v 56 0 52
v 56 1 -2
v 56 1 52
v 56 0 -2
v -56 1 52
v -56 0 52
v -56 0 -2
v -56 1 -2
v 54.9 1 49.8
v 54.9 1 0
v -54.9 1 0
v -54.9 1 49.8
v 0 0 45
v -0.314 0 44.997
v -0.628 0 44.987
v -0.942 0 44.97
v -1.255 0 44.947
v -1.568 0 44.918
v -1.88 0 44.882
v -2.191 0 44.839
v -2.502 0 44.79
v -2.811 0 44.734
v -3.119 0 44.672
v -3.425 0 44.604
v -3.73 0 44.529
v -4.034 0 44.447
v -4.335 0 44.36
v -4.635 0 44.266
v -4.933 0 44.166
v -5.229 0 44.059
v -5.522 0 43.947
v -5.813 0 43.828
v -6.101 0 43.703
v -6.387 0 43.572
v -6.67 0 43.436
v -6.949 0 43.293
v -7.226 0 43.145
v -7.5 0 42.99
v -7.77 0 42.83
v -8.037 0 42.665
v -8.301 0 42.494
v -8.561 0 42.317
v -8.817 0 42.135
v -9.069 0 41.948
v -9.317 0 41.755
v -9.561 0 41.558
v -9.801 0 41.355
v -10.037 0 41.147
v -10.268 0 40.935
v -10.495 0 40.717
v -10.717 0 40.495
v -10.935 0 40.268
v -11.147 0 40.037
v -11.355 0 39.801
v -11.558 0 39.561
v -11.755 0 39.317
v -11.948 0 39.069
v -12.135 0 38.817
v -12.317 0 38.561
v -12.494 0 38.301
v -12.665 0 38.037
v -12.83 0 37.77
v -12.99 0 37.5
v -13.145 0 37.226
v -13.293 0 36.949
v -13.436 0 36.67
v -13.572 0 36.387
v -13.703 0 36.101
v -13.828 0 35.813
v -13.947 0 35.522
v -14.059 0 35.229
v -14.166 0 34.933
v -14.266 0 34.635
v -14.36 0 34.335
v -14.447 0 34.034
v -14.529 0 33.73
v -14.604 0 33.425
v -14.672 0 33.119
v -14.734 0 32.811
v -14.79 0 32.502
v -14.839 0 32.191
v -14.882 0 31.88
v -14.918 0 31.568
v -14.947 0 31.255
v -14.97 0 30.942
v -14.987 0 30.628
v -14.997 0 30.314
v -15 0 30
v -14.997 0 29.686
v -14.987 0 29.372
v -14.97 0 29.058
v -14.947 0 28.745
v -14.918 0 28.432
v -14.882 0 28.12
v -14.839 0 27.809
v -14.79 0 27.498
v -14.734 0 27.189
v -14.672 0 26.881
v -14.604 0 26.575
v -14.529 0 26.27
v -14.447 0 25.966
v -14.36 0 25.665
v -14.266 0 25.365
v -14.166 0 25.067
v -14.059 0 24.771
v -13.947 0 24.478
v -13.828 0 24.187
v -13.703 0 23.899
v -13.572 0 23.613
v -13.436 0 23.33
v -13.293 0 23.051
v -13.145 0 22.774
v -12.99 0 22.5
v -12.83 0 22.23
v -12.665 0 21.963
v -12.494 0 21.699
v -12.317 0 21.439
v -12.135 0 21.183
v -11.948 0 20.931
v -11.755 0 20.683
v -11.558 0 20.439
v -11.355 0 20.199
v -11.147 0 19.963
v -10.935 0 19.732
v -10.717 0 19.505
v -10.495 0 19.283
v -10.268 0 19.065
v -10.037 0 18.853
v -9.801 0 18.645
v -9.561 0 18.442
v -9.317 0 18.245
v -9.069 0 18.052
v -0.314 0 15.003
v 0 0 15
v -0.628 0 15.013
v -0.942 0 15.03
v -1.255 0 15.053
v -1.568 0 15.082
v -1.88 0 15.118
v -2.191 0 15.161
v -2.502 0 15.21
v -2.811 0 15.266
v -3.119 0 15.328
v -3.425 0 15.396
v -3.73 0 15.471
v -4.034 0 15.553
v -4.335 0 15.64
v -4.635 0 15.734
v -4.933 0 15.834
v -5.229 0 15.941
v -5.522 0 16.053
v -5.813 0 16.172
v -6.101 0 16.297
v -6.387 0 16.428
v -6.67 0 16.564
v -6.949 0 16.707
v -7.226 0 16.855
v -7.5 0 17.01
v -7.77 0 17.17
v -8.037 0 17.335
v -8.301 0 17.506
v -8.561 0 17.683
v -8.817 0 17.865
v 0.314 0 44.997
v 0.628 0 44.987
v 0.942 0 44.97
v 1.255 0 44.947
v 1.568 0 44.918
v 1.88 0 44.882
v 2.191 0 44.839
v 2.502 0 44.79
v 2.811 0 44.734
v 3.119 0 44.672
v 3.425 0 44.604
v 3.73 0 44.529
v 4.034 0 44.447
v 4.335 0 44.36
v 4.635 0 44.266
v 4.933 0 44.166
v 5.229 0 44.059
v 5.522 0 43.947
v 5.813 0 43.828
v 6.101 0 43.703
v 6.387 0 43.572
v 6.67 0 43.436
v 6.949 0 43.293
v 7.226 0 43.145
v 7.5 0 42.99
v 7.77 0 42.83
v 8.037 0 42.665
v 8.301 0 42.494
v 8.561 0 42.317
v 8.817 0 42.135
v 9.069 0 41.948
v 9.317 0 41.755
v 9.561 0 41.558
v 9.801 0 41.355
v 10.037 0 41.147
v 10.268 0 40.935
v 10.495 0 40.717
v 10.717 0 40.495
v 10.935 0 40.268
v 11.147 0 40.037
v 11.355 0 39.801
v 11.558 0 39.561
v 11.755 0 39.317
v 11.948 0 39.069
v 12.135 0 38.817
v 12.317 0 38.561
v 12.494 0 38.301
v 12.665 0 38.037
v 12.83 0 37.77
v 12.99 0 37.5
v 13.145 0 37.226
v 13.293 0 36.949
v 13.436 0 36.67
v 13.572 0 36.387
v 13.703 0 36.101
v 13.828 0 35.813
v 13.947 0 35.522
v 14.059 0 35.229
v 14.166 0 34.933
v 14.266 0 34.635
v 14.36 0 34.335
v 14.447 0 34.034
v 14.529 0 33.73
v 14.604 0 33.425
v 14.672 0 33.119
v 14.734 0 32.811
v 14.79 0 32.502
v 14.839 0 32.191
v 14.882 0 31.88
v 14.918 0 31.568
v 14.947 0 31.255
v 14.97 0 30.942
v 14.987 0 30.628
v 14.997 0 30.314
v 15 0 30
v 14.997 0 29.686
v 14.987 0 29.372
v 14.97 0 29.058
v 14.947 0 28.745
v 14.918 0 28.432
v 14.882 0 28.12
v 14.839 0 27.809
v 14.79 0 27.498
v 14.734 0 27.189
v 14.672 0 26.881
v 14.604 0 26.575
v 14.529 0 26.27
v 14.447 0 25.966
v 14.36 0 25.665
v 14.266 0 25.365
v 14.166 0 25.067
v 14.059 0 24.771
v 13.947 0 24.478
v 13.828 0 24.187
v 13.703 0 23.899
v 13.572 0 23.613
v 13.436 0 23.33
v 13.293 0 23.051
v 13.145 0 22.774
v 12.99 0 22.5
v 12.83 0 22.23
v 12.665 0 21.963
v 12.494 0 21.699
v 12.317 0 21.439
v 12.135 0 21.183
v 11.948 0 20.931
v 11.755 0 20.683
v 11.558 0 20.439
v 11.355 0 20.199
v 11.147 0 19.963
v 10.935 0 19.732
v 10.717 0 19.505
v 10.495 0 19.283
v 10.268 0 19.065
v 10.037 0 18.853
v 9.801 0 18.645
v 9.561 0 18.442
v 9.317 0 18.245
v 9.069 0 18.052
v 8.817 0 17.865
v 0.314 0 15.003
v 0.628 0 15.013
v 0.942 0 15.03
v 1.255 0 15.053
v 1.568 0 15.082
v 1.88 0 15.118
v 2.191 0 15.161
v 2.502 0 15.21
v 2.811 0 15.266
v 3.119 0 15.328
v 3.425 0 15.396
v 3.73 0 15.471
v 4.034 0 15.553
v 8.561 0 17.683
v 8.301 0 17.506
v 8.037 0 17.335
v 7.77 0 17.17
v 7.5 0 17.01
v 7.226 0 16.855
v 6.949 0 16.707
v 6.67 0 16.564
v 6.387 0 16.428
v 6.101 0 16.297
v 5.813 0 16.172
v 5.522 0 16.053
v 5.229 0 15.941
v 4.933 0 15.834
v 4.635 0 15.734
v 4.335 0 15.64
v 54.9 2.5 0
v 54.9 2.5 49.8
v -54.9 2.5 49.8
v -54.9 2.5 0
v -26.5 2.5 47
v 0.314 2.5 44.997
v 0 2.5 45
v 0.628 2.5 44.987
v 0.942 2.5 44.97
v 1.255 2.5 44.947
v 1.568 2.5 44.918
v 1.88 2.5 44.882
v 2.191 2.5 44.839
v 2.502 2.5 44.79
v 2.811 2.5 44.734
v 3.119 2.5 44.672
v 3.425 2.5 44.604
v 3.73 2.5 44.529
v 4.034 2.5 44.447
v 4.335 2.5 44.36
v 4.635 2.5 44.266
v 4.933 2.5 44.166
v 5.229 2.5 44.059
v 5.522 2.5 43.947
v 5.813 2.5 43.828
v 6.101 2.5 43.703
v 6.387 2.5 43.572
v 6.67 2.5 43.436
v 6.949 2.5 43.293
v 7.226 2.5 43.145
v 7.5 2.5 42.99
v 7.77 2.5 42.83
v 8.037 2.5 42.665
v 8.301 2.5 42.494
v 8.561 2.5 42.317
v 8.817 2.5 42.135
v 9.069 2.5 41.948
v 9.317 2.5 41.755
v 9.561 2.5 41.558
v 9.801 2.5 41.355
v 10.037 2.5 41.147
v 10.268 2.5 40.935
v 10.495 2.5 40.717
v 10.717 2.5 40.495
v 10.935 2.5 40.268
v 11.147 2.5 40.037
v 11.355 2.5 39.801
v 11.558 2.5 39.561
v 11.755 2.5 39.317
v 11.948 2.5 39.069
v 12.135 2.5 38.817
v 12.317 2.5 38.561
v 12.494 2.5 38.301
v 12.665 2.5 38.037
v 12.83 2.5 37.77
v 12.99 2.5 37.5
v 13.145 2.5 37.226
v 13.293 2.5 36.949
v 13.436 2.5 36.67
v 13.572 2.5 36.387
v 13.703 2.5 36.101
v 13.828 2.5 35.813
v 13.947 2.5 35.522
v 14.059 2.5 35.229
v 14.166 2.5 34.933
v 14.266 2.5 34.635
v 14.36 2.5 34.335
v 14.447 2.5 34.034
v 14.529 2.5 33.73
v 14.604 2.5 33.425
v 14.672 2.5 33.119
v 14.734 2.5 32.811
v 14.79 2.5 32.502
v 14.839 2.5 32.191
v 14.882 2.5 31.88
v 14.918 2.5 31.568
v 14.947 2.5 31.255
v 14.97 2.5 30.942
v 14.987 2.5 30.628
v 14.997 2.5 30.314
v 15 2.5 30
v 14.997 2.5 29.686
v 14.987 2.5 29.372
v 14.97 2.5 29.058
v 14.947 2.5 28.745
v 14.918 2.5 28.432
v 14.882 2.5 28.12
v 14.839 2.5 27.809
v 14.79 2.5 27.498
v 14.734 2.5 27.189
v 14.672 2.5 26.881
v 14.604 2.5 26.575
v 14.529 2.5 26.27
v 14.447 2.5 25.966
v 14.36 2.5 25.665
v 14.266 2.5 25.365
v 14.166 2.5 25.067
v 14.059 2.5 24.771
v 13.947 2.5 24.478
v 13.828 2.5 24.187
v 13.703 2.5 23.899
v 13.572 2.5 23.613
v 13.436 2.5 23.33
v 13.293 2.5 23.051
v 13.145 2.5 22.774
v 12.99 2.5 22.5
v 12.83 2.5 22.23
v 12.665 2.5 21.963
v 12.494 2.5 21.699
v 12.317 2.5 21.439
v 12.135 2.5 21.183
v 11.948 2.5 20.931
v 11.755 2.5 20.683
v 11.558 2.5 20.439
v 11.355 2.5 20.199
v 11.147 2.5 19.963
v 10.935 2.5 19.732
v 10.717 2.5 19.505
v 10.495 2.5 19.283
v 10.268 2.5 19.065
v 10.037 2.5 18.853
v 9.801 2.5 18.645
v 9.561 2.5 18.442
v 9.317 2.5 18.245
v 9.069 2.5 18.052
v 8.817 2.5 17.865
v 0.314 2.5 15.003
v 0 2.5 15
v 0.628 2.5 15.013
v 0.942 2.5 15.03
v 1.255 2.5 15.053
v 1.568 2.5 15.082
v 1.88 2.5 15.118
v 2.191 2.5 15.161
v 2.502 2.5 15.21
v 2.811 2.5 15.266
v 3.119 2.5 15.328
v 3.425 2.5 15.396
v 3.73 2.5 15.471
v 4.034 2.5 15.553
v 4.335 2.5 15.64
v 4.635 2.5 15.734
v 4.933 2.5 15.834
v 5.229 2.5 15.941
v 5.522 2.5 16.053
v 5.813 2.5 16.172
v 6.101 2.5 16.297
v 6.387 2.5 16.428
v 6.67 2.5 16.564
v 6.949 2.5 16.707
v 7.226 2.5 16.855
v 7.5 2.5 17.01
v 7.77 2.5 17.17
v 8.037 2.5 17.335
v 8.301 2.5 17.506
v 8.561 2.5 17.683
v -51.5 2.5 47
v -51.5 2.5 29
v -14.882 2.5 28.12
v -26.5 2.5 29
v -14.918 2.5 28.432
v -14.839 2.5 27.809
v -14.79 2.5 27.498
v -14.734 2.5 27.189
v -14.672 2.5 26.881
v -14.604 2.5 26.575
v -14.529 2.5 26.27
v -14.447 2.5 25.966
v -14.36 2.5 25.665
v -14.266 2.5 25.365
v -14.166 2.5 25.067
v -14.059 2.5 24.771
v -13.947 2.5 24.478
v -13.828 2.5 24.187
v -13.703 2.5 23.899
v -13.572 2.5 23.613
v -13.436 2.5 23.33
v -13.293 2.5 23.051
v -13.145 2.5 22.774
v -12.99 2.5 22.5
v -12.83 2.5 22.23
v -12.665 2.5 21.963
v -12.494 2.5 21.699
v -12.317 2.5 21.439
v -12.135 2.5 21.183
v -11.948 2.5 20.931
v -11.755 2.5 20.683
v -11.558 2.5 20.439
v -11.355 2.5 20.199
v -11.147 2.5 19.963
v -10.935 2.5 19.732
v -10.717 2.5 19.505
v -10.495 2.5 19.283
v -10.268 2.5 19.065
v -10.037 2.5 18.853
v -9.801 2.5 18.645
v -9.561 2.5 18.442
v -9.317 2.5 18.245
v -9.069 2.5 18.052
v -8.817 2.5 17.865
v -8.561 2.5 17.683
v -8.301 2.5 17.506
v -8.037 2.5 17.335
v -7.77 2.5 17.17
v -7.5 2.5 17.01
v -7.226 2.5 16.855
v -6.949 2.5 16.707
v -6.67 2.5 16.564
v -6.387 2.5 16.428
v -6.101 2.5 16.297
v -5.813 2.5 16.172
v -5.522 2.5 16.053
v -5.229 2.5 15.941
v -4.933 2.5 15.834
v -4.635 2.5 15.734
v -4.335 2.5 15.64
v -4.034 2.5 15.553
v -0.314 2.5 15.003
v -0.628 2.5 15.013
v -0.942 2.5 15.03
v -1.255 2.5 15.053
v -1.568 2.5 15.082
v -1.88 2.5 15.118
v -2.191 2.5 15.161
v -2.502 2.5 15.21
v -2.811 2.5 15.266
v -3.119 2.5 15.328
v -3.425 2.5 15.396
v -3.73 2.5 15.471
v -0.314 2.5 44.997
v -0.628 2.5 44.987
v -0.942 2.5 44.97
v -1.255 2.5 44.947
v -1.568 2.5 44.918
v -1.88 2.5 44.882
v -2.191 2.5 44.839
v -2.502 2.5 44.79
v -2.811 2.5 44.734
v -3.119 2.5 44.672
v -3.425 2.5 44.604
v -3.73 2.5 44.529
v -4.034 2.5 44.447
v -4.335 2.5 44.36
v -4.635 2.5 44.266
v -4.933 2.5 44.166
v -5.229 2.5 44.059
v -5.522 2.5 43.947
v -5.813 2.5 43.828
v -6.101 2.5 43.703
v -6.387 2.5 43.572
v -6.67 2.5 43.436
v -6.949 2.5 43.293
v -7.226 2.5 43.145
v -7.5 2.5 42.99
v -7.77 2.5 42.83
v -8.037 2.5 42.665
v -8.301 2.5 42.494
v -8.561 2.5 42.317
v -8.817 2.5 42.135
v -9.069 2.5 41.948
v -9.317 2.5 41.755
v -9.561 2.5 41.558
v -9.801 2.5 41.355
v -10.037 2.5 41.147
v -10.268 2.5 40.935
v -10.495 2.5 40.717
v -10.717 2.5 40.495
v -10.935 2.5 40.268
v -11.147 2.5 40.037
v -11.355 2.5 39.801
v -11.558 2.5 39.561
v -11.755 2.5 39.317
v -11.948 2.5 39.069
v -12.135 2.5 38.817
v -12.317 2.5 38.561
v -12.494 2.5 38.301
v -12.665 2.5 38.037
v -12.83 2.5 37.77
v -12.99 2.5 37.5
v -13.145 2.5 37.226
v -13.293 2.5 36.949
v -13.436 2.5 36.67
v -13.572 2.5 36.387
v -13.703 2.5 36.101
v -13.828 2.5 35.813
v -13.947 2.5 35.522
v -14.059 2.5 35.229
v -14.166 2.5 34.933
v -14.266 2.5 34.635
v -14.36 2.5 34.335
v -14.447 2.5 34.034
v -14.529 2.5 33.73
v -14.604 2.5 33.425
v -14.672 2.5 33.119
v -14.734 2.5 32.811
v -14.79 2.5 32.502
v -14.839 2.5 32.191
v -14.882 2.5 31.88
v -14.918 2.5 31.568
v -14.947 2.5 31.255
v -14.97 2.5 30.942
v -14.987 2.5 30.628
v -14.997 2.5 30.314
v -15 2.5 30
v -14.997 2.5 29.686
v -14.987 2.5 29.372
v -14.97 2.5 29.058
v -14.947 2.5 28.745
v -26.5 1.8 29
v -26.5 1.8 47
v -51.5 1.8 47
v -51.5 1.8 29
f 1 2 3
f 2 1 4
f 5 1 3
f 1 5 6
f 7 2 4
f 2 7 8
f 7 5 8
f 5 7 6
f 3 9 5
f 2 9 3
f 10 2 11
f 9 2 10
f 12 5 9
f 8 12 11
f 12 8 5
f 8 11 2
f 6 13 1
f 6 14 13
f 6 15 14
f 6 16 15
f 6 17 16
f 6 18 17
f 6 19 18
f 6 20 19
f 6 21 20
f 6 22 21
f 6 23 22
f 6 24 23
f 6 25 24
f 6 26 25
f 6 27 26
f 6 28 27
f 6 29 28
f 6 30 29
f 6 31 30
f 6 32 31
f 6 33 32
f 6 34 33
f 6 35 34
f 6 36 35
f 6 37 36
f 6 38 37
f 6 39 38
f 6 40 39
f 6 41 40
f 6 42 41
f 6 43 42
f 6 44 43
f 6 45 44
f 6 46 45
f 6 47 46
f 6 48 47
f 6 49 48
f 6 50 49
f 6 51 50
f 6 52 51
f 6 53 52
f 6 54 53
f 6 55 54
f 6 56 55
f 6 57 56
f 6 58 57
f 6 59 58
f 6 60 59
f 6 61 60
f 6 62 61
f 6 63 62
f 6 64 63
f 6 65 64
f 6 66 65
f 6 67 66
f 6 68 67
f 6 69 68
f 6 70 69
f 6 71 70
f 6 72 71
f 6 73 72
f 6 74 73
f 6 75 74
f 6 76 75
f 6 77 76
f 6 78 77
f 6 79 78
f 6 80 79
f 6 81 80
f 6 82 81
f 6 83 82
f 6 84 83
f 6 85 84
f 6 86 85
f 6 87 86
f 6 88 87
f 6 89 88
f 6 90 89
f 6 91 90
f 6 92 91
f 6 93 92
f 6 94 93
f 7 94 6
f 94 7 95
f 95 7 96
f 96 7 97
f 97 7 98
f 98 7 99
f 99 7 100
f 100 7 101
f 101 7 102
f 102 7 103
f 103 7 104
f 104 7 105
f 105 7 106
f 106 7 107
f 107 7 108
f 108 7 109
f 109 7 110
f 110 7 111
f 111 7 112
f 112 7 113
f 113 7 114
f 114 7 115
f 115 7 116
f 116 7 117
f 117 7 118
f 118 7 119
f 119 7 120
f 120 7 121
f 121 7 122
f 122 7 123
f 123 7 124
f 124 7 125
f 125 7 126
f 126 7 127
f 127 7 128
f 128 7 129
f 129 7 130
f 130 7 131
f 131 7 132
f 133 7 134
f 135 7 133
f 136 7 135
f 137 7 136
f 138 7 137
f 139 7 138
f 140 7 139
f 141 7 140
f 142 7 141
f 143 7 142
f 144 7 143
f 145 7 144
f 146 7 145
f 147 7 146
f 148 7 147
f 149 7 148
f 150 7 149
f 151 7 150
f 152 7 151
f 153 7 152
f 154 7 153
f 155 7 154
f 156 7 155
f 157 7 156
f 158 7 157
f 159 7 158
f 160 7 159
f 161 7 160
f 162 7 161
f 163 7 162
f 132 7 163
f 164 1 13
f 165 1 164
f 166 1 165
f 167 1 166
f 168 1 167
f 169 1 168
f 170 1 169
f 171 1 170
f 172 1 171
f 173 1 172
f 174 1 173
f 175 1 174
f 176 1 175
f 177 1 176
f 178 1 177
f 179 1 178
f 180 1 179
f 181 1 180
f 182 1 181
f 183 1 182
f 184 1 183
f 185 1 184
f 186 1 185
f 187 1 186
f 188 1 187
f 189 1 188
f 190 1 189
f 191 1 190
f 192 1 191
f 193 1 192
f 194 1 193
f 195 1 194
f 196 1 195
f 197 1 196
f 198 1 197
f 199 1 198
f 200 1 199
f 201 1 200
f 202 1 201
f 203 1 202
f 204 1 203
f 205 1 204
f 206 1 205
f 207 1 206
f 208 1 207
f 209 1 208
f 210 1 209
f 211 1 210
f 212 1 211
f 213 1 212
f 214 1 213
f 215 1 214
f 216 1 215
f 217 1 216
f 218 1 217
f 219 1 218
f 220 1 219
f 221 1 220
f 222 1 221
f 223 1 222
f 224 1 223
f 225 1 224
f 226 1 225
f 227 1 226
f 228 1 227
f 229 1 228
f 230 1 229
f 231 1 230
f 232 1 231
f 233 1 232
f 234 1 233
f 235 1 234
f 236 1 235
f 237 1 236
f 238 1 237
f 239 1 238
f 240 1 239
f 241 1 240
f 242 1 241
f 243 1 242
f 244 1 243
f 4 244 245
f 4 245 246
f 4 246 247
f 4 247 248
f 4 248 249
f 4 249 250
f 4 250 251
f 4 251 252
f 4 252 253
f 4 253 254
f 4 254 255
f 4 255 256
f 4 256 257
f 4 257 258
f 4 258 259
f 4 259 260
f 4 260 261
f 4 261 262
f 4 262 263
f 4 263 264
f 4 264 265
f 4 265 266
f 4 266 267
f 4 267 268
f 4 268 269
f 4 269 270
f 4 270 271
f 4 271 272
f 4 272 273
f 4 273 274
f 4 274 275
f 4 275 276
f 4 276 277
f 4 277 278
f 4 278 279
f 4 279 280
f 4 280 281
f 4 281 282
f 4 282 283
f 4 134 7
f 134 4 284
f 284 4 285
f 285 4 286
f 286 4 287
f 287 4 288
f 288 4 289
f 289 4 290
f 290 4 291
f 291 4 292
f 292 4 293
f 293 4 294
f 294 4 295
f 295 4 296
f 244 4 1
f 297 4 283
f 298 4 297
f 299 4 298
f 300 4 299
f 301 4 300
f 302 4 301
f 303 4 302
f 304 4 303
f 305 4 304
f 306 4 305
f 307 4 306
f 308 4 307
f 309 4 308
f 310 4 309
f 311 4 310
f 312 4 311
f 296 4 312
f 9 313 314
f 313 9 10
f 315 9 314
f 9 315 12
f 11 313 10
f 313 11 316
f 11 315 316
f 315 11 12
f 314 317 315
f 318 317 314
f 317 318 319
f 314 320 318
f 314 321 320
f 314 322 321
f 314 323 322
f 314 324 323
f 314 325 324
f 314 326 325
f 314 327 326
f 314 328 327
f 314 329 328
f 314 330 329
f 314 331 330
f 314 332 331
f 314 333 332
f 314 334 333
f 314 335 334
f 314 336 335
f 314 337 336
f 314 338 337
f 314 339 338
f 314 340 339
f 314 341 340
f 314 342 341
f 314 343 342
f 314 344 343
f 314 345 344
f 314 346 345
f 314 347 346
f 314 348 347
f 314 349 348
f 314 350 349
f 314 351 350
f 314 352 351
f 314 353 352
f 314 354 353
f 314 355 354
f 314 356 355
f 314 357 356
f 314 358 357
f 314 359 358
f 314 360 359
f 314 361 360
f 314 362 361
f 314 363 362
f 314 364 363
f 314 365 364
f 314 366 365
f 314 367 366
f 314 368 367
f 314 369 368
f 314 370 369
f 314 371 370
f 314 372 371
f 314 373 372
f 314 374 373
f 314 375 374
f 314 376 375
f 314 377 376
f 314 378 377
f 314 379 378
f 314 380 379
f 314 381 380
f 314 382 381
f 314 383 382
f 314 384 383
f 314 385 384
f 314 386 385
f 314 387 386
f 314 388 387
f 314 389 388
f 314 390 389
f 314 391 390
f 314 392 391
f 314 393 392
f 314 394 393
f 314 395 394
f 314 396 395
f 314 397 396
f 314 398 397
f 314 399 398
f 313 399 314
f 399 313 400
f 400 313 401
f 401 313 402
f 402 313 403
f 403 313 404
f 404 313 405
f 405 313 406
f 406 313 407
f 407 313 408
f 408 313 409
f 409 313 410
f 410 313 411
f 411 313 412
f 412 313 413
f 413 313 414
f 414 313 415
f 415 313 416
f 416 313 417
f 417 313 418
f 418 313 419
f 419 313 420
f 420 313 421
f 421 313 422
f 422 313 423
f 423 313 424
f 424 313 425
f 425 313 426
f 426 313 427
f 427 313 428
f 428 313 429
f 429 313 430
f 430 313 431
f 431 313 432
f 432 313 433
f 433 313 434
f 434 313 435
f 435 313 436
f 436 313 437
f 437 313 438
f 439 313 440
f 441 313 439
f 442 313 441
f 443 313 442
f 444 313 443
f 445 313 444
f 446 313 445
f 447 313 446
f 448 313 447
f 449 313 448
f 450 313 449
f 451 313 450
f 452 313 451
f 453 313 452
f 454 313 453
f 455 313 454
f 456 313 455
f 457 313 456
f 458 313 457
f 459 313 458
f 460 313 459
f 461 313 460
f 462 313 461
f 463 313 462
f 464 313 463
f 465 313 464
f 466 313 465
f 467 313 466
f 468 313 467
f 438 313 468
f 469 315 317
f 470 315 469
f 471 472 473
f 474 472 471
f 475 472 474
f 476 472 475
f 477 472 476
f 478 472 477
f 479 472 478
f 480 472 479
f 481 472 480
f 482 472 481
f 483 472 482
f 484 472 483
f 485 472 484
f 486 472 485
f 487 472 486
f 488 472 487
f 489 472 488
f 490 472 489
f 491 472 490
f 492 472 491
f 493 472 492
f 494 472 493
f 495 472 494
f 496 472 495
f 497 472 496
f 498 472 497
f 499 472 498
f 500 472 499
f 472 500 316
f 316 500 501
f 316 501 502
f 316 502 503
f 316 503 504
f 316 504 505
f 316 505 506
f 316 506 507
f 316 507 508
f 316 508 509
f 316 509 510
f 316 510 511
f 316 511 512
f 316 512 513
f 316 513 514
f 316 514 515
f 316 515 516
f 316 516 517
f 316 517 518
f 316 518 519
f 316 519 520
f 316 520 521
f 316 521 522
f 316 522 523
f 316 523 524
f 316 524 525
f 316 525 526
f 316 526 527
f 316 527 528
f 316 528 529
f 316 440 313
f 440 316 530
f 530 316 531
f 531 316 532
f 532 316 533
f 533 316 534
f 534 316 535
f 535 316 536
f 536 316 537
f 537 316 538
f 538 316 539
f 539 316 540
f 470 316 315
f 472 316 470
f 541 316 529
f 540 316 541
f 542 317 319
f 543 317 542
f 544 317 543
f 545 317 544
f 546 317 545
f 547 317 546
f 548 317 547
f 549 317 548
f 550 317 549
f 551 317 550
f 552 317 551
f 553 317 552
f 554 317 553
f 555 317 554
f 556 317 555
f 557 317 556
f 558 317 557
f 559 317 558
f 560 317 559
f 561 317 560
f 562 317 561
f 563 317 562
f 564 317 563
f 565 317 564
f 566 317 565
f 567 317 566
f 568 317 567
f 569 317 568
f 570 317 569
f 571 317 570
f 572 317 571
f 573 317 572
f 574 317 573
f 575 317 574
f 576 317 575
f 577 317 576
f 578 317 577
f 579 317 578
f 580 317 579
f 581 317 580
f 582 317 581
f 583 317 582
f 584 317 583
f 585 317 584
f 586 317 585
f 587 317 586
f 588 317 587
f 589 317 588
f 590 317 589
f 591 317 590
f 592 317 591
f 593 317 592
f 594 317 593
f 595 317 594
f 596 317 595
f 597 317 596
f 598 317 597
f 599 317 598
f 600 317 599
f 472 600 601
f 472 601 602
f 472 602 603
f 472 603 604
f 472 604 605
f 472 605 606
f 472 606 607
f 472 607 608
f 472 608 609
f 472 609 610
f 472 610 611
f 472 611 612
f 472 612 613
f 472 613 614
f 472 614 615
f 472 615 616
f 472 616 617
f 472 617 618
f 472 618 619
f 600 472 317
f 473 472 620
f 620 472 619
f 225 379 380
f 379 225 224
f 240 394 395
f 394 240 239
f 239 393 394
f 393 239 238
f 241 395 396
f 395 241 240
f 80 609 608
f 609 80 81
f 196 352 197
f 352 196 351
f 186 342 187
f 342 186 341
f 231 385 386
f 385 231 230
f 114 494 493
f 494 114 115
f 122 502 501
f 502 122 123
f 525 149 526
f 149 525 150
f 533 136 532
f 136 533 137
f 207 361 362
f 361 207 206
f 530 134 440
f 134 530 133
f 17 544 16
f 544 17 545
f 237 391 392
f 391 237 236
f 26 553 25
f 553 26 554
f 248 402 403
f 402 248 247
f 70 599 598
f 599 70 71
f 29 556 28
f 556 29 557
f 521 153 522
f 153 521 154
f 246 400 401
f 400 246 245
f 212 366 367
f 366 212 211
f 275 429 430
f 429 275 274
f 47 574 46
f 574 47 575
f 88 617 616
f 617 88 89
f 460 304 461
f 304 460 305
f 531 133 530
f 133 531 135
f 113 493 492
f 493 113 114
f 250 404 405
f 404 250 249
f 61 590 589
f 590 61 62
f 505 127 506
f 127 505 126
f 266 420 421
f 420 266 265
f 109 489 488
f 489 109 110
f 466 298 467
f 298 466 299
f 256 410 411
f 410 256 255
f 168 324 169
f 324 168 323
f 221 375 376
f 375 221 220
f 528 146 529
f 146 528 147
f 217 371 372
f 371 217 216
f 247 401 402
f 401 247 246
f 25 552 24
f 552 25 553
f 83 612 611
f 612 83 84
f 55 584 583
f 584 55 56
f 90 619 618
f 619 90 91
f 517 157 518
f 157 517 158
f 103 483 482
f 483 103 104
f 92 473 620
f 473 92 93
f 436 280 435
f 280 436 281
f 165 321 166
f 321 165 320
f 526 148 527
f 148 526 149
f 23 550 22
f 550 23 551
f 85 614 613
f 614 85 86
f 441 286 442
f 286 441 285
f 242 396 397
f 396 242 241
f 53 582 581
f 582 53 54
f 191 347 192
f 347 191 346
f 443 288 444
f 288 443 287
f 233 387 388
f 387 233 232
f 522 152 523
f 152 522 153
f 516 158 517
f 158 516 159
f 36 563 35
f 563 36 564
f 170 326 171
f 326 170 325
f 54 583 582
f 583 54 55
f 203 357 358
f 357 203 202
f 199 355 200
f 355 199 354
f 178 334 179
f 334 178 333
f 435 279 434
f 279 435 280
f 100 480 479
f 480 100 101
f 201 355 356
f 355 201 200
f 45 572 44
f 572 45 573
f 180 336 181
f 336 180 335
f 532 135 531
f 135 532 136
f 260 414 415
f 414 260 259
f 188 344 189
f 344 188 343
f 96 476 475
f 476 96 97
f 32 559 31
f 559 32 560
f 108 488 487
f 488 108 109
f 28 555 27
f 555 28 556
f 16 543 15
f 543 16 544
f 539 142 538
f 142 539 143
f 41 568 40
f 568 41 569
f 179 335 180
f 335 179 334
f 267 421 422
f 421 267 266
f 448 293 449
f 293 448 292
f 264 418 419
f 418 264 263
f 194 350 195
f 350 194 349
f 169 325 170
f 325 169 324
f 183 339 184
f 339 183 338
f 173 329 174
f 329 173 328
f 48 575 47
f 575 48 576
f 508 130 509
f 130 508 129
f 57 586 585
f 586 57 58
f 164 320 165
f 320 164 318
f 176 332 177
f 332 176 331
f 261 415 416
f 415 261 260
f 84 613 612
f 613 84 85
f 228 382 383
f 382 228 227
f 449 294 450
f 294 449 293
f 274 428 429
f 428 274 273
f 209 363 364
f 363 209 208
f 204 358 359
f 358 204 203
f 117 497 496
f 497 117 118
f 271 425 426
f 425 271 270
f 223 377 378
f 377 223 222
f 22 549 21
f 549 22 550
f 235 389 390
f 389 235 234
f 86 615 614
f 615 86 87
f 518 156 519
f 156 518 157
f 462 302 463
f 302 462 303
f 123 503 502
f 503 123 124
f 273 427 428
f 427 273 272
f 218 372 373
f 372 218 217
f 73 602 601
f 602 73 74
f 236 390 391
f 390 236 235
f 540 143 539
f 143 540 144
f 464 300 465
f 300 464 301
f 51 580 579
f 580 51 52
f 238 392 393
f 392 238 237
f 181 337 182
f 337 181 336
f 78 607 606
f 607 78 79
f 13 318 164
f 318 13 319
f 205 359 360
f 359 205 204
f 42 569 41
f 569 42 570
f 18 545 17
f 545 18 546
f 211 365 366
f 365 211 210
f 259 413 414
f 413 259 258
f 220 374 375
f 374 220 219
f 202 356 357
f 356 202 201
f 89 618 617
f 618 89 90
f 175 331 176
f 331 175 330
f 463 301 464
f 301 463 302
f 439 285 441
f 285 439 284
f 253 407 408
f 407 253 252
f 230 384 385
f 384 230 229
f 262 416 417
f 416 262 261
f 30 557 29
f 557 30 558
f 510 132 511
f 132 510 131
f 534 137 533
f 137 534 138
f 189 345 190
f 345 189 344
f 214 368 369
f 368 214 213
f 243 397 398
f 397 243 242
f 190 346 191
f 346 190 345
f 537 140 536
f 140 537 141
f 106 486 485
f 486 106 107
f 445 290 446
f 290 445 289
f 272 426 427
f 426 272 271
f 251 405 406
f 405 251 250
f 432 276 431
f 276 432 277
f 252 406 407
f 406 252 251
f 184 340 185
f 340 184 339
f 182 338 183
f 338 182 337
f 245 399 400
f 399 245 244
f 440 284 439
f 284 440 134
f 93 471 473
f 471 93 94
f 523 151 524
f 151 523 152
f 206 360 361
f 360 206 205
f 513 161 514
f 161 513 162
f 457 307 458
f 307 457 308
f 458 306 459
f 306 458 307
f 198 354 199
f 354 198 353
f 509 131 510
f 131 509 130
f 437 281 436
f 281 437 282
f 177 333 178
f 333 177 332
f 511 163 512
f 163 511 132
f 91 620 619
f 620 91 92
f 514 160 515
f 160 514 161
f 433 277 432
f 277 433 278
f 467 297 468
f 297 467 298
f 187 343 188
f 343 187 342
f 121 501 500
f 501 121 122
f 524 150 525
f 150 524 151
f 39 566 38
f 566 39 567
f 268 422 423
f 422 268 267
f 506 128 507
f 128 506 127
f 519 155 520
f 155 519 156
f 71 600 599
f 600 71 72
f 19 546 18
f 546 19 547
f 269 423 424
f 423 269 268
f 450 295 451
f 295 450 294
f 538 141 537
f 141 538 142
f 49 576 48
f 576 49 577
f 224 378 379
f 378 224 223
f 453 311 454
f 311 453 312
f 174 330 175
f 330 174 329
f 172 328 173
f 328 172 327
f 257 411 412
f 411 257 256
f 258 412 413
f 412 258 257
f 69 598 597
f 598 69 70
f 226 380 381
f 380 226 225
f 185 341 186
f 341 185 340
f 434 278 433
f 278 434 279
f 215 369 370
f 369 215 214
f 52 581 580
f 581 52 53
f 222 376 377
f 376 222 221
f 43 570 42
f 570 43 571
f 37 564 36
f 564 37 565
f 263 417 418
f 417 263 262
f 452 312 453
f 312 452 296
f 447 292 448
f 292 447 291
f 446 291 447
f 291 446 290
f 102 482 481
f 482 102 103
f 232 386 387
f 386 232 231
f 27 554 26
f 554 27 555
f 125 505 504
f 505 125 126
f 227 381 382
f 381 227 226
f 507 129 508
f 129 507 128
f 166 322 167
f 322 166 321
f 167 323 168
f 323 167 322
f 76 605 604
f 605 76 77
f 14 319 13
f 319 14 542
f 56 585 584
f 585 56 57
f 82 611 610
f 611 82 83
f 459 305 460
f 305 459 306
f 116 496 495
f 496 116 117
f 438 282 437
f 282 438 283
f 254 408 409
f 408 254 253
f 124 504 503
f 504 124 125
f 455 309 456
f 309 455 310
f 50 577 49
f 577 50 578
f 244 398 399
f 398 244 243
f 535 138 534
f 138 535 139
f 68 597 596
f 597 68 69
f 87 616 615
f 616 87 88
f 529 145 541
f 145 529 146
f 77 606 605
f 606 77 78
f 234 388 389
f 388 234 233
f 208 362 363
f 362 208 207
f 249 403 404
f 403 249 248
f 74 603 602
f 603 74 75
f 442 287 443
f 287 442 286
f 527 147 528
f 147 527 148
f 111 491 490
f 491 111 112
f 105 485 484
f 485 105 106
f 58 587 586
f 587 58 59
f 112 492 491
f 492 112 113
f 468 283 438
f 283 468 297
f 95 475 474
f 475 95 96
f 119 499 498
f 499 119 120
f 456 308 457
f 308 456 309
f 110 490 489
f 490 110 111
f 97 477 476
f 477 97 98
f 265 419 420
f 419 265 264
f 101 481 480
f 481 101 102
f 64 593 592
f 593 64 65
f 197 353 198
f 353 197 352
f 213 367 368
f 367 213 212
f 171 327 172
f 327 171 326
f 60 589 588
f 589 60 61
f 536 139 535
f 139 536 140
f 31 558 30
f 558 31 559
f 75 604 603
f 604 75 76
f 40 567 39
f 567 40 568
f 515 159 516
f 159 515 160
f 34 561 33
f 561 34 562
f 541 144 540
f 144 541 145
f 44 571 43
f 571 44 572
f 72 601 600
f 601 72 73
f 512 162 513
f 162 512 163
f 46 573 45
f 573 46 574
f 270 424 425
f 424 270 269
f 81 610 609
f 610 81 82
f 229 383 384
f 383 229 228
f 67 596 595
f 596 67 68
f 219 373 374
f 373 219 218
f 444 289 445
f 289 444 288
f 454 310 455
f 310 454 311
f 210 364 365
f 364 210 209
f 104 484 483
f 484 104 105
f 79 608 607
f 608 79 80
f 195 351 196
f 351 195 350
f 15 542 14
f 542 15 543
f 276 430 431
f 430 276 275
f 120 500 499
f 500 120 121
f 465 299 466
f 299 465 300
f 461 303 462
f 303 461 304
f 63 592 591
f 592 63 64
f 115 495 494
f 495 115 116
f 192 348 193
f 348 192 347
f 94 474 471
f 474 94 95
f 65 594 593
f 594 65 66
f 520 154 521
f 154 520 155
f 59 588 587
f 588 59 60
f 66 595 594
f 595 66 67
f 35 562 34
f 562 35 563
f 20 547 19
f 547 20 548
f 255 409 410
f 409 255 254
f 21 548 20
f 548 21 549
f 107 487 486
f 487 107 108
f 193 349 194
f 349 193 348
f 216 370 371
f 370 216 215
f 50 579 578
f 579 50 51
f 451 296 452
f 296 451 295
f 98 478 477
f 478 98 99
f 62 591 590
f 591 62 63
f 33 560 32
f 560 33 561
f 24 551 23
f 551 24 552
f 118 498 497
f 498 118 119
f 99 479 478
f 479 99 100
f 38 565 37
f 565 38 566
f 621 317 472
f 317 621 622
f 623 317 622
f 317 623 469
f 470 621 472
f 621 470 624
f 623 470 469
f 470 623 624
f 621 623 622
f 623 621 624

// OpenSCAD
$fn=30;

if($preview){
  *translate([0,-6.4,0])rotate([90,0,0])picsy_hw(2);
  assembly();
}else{
  $fn=300;
  *mirror([0,0,0])translate([130/2,0,70])trigger_body();
  *mirror([0,0,0])translate([130/2,0,70])trigger_button();
  front_plate();
}

// ######## assembly ########
module assembly(){
  main_body(true);
  translate([0,0,0])trigger_button_body_l();
  translate([0,0,0])trigger_button_body_r();
  translate([0,-12.5,0])back_plate();
  translate([0,12.5,0])front_plate();
  bh=4;
  translate([0,0,-bh])bottom_cover(bh);
}

// ######## main ########
module main_body(finish=false){
  h=70-12.6;
  t=30;l=130;
  color("MediumAquamarine")
  difference(){
    union(){
      // main body
      translate([0,0,h/2])cube([l,t,h],center=true);
    }union(){
      // main notch
      translate([0,0,50/2-0.1])cube([110,t+2,50.1],center=true);
      // flaps
      translate([0,t/2-2,52.2/2])cube([112.2,1,52.2],center=true);
      translate([0,-t/2+2,52.2/2])cube([112.2,1,52.2],center=true);
      // pcb & parts
      translate([0,-7.3,55/2-0.1])cube([125.6,1.75,55.4],center=true);
      translate([0,-7.3+4,55/2-0.1])cube([121,12,55.1],center=true);
      // usb-port
      usbcd=2.5;
      translate([60,3.2/2-6.4,4.5+1])rotate([0,90,0])minkowski(){
        cylinder(d=usbcd,h=1);
        cube([9-usbcd,3.2-usbcd,9.5],center=true);
      }
      translate([58,3.2/2-6.4,4.5+1-5.5])rotate([0,90,0])minkowski(){
        cylinder(d=usbcd,h=1);
        cube([20-usbcd,3.2-usbcd,9.5],center=true);
      }
      // sd card
      translate([l/2,2/2-6.4,5+14.8])cube([12.2,2.2,12.4],center=true);
      translate([l/2-9,2/2-6.4,5+8])cube([12.2,2.2,12.4],center=true);
      intersection(){
        translate([l/2,2/2-6.4,5+14.8])scale([2,4.2,14.2])sphere(d=1);
        translate([l/2,2/2-6.4,5+14.8])cube([12,6,12.4],center=true);
      }
      // lanyard
      for(i = [-1:2:1]){
        translate([130/2*i,0,34])cylinder(d=2,h=16);
        translate([130/2*i,0,34+4])cylinder(d=7,h=8);
      }
      // pins
      for(i = [-1:2:1]){
        translate([l/2*i-15*i,-11,h-(18-11.6)])cylinder(d=2,h=18);
        // spring
        translate([l/2*i-6*i,2,h-(18-11.6)])cylinder(d=4.6,h=10);
        // trigger button
        translate([l/2*i-4*i,8,h-10])cylinder(d=1,h=16);
        translate([l/2*i-4*i,-9,h-10])cylinder(d=1,h=16);
      }
      // vertical pins
      for(i = [-1:2:1]){
        translate([(l-7)/2*i,-12,-1.5])rotate([0,0,0])cylinder(d=2,h=30);
      }
      // trigger
      for(i = [-1:2:1]){
        translate([(l/2-15/2-2)*i,-4,-8/2+h+1])cube([15,6,8],center=true);
        *translate([(l/2-15/2-4.5)*i,-8,-4/2+h-1])cube([4,6,4],center=true);
        translate([(l/2-15)*i,6,h-20])cylinder(d=3,h=25);
      }
      // knobs
      for(i = [-1:1:1]){
        translate([32.5*i,0,40])cylinder(d=16.2,h=25);
      }
      // edges
      if(finish){
        corn_z=1;
        for(i = [-1:2:1]){
          for(j = [-1:2:1]){
            translate([l/2*i,t/2*j,h/2])rotate([0,0,45])cube([corn_z,corn_z,h+2],center=true);
          }
        }
      }
    }
  }
  sl=8;
  color("MediumAquamarine")
  for(i = [0:1:1]){
    mirror([i,0,0])
    difference(){
      union(){
        hull(){
          translate([110/2-sl/2,sl/2+2.7,7/2])cube([sl,sl,7],center=true);
          translate([110/2+1/2,sl/2+2.7,30/2])cube([1,sl,30],center=true);
        }
      }union(){
        translate([110/2-sl/2,sl/2+2.7,-0.5])cylinder(d=3.9,h=8);
        translate([110/2-sl/2,sl/2+2.7,-0.5])cylinder(d=4.05,h=2);
      }
    }
  }
}

// ######## bottom cover ########
module bottom_cover(h){
  t=30;l=130;
  color("PaleGoldenrod")
  difference(){
    union(){
      // body
      translate([0,0,h/2])cube([l,t,h],center=true);
      // 1/4"
      hull(){
        translate([0,3,0])cylinder(d=13,h=13.7);
        translate([0,3,1/2])cube([40,8,1],center=true);
      }
    }union(){
      // flaps
      translate([0,t/2-2,-2/2+h])cube([112.2,1,2.2],center=true);
      translate([0,-t/2+2,-2/2+h])cube([112.2,1,2.2],center=true);
      // big corners
      for(i = [-1:2:1]){
        translate([l/2*i,0,0])rotate([0,45,0])cube([sqrt(h*h+h*h),t+2,sqrt(h*h+h*h)],center=true);
      }
      // smol corners
      corn_z=1;
      for(i = [-1:2:1]){
        for(j = [-1:2:1]){
          translate([l/2*i,t/2*j,h/2])rotate([0,0,45])cube([corn_z,corn_z,h+2],center=true);
        }
      }
      // screws
      for(i = [-1:2:1]){
        translate([(110/2-8/2)*i,8/2+2.7,-0.5])cylinder(d=3,h=8);
        translate([(110/2-8/2)*i,8/2+2.7,-0.5])cylinder(d=5.5,h=3.5);
      }
      // horizontal pins
      for(i = [-1:2:1]){
        translate([(l-15)/2*i,10,2])rotate([90,0,0])cylinder(d=2,h=30);
      }
      // vertical pins
      for(i = [-1:2:1]){
        translate([(l-7)/2*i,-12,3])rotate([0,0,0])cylinder(d=2,h=30);
      }
      // reset
      translate([32.25,-5.75,-0.5])cylinder(d=1,h=8);
      translate([32.25,-5.75,h-1.9])cylinder(d=3,h=2);
      // switch
      translate([-44.75,-3.75,h/2])cube([4.22,2.2,h+1],center=true);
      translate([-44.75,-3.75,0])minkowski(){
        cube([4,2,1],center=true);
        scale([14,8,4])sphere(d=1);
      }
      // 1/4"
      translate([0,3,-0.5])cylinder(d=8,h=14.2);
      translate([0,3,-0.5])cylinder(d2=8,d1=9,h=1);
    }
  }
}

// ######## trigger buttons ########
module trigger_button_body_r(){
  mirror([1,0,0])translate([130/2,0,70])trigger_body();
  mirror([1,0,0])translate([130/2,0,70])trigger_button();
}

module trigger_button_body_l(){
  mirror([0,0,0])translate([130/2,0,70])trigger_body();
  *mirror([0,0,0])translate([130/2,0,70])trigger_button();
}

module trigger_body(){
  color("CornflowerBlue")
  difference(){
    union(){
      // height 12.6!!
      translate([-(130-90)/2/2,0,-12.6/2])cube([(130-90)/2,30,12.6],center=true);
      // counter
      *translate([-12,-7.8,-4/2-12.5])cube([3.8,2,4],center=true);
      *hull(){
        translate([-12,-7.8-1,-1/2-12.5-1.2])cube([3.8,2,1],center=true);
        translate([-12,-7.8,1/2-12.5-4])cube([3.8,2,1],center=true);
      }
    }union(){
      // cutouts
      translate([0,0,-13.6])scale([20,26,1])cylinder(d=1,h=14.6);
      translate([-2,0,-13.6])scale([20,26,1])cylinder(d=1,h=12.6);
      *intersection(){
        translate([0,0,-15])scale([20,26,1])cylinder(d=1,h=25);
        translate([-20/2-0.5,0,-12.8/2-0.1])cube([20,30,12.8],center=true);
      }
      translate([0,0,0])cube([1.5,1.5,10],center=true);
      // screw
      translate([-15,6,-0.5-12.6])cylinder(d=3.9,h=9);
      // pin
      translate([-15,-11,-19])cylinder(d=2,h=18);
      // edges
      corn_z=1;
      for(j = [-1:2:1]){
        translate([0,30/2*j,-12.6/2])rotate([0,0,45])cube([corn_z,corn_z,12.6+2],center=true);
      }
    }
  }
}

module trigger_button(){
  color("IndianRed")
  difference(){
    union(){
      // main button
      intersection(){
        translate([0,0,-8.6])scale([19.95,25.95,1])cylinder(d=1,h=9.6);
        translate([-20/2-0.5,0,-12.8/2-0.1])cube([19.95,29,12.8],center=true);
      }
      intersection(){
        translate([-2,0,-9.6])scale([20,26,1])cylinder(d=1,h=8.6);
        translate([-20/2-0.5,0,-12.8/2-0.1])cube([19.95,29,12.8],center=true);
      }
      // microswitch contactor
      translate([-4/2-5,-4,2.5/2-12.6])cube([4,4,4],center=true);
      *translate([-10/2-3,-4,-2.5/2-12.6])cube([10,4,2.5],center=true);
      *hull(){
        translate([-4/2-3,-4,2.5/2-12.6])cube([4,4,2.5],center=true);
        translate([-4/2-1,-2,-2.5/2-5])cube([4,15,2.5],center=true);
      }
    }union(){
      // sink for finger
      translate([0,0,0])scale([19.95,25.95,1.5])sphere(d=1);
      // spring
      translate([-6,2,-12])cylinder(d=4.6,h=10);
      // pins
      translate([-4,8,-17.5])cylinder(d=1,h=16);
      translate([-4,-9,-17.5])cylinder(d=1,h=16);
    }
  }
}

// ######## plates ########
module front_plate(){
  color("RosyBrown")
  difference(){
    union(){
      translate([0,1/2,54/2-2])cube([112,1,54],center=true);
      translate([0,1.5/2+1,49.8/2])cube([109.8,1.5,49.8],center=true);
    }union(){
      // lens
      translate([0,-1,30])rotate([-90,0,0])cylinder(d=30,h=6);
      //translate([0,-1,30])rotate([-90,0,0])cylinder(d=34,h=2.5);
      // text
      //translate([-29,2.2,36])rotate([90,0,180])linear_extrude(height=0.5)text("PICSY", font="Pixelary");
      translate([-39,1/2+1.8,38])cube([25,1,18],center=true);
    }
  }
   if($preview){
    translate([0,3,30])rotate([-90,0,0])uv_filter_30mm();
  }
}

module back_plate(){
  color("PaleVioletRed")
  difference(){
    union(){
      translate([0,-1/2,54/2-2])cube([112,1,54],center=true);
      translate([0,-1.5/2-1,49.8/2])cube([109.8,1.5,49.8],center=true);
    }union(){
      // 2.0"
      translate([-15.5,-3.5/2+0.5,22.5])cube([42.9,3.5,33.6],center=true);
      translate([-15.5,-2/2,22.5])cube([46,2.1,36],center=true);
      // 0.99"
      translate([32.5,-3.5/2+0.5,22.5])cube([6.695,3.5,24.985],center=true);
      translate([32.5,-2/2,22.5])cube([10,2.1,28],center=true);
      // text
      translate([-32.5,-2.2,45])rotate([90,0,0])linear_extrude(height=0.5)scale([0.3,0.3])text("Dithering", font="madspixel2", halign="center");
      translate([0,-2.2,45])rotate([90,0,0])linear_extrude(height=0.5)scale([0.3,0.3])text("Palette", font="madspixel2", halign="center");
      translate([32.5,-2.2,45])rotate([90,0,0])linear_extrude(height=0.5)scale([0.3,0.3])text("Exposure", font="madspixel2", halign="center");
    }
  }
}

module uv_filter_30mm(){
  color("black")
  difference(){
    union(){
      cylinder(d=34,h=3);
      translate([0,0,-2.5])cylinder(d=30,h=2.5);
    }union(){
      translate([0,0,1])cylinder(d=31,h=3.1);
      translate([0,0,-2.6])cylinder(d=28,h=3.7);
    }
  }
}

// ######## camera ########
module button_inlay(){
  color("gray")
  difference(){
    union(){
      cylinder(d=8.5,h=7.5);
    }union(){
      translate([0,0,-1])cylinder(d=6,h=9.5);
    }
  }
  translate([0,0,7/2])cube([6.5,1,7],center=true);
}


// ######## camera ########
module picsy_hw(lvl = 3){
  color("Lavender")
  if(lvl == 1){
    import("picsy-hw-0100.stl", convexity=3);
  }else if(lvl == 2){
    import("picsy-hw-stripped.stl", convexity=3);
  }else{
    import("picsy-hw-stripped-2.stl", convexity=3);
  }
}
